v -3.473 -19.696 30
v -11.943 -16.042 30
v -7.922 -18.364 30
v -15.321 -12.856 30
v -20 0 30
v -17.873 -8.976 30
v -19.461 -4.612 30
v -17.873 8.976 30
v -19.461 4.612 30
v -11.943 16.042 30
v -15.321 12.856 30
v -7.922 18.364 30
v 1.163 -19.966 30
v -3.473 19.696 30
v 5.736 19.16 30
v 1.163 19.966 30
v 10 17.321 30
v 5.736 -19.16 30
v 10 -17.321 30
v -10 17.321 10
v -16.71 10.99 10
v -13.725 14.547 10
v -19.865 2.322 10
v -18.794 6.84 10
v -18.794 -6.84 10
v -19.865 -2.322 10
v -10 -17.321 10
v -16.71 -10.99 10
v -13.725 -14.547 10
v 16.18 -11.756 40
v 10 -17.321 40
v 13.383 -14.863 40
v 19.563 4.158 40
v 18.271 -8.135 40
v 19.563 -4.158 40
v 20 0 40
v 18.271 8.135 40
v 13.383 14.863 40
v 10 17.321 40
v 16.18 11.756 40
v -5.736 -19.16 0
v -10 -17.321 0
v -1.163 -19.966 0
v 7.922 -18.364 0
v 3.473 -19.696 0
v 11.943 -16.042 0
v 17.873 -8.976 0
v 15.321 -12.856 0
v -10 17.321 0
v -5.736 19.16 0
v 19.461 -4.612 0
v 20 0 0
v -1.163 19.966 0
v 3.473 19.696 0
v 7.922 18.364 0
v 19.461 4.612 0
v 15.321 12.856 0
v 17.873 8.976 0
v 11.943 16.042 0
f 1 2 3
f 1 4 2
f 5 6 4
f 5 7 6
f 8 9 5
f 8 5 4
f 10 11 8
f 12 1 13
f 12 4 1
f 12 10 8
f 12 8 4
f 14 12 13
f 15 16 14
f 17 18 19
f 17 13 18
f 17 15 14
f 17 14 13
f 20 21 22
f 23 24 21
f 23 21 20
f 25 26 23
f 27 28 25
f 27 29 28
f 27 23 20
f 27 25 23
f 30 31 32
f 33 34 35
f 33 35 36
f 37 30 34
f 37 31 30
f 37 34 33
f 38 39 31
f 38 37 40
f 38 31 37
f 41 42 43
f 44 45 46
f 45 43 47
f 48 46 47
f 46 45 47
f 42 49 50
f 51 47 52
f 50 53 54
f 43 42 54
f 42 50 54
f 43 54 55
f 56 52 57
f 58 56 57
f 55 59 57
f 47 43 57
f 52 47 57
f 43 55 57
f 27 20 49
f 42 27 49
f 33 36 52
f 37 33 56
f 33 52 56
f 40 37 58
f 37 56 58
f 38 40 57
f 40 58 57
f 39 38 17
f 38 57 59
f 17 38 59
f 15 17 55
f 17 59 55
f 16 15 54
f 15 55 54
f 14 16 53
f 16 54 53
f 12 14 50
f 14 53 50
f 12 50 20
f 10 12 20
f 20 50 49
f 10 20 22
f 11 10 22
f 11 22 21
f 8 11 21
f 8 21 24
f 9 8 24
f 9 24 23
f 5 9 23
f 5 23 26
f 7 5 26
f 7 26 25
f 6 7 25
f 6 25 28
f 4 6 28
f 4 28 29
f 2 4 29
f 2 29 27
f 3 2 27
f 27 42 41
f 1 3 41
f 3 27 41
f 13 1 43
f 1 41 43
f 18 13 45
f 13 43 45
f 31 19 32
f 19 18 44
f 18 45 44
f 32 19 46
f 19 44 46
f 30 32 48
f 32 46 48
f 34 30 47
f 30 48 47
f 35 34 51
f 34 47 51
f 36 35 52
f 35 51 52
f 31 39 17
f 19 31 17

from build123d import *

# Parameters (mm, degrees)
SKETCH1_R               = 20
BOSS_EXTRUDE1_DEPTH     = 40
CUT_EXTRUDE1_DEPTH      = 40
CUT_EXTRUDE1_DEPTH_BACK = 40
SKETCH2_W               = 30
SKETCH2_H               = 10
SKETCH2_W_2             = 10


with BuildPart() as part:
    # Sketch1 → Boss-Extrude1 (new body)
    with BuildSketch(Plane.XY):
        Circle(SKETCH1_R)
    extrude(amount=BOSS_EXTRUDE1_DEPTH)

    # Sketch2 → Cut-Extrude1 (cut, two sides: drawn at the far end of the back side and taken through both)
    with BuildSketch(Plane(origin=(0, 0, 0), x_dir=(1, 0, 0), z_dir=(0, 1, 0)).offset(-CUT_EXTRUDE1_DEPTH_BACK)):
        with Locations((-5, -35)):
            Rectangle(SKETCH2_W, SKETCH2_H)
        with Locations((-15, -5)):
            Rectangle(SKETCH2_W_2, SKETCH2_H)
    extrude(amount=CUT_EXTRUDE1_DEPTH + CUT_EXTRUDE1_DEPTH_BACK, mode=Mode.SUBTRACT)


solid = part.part
